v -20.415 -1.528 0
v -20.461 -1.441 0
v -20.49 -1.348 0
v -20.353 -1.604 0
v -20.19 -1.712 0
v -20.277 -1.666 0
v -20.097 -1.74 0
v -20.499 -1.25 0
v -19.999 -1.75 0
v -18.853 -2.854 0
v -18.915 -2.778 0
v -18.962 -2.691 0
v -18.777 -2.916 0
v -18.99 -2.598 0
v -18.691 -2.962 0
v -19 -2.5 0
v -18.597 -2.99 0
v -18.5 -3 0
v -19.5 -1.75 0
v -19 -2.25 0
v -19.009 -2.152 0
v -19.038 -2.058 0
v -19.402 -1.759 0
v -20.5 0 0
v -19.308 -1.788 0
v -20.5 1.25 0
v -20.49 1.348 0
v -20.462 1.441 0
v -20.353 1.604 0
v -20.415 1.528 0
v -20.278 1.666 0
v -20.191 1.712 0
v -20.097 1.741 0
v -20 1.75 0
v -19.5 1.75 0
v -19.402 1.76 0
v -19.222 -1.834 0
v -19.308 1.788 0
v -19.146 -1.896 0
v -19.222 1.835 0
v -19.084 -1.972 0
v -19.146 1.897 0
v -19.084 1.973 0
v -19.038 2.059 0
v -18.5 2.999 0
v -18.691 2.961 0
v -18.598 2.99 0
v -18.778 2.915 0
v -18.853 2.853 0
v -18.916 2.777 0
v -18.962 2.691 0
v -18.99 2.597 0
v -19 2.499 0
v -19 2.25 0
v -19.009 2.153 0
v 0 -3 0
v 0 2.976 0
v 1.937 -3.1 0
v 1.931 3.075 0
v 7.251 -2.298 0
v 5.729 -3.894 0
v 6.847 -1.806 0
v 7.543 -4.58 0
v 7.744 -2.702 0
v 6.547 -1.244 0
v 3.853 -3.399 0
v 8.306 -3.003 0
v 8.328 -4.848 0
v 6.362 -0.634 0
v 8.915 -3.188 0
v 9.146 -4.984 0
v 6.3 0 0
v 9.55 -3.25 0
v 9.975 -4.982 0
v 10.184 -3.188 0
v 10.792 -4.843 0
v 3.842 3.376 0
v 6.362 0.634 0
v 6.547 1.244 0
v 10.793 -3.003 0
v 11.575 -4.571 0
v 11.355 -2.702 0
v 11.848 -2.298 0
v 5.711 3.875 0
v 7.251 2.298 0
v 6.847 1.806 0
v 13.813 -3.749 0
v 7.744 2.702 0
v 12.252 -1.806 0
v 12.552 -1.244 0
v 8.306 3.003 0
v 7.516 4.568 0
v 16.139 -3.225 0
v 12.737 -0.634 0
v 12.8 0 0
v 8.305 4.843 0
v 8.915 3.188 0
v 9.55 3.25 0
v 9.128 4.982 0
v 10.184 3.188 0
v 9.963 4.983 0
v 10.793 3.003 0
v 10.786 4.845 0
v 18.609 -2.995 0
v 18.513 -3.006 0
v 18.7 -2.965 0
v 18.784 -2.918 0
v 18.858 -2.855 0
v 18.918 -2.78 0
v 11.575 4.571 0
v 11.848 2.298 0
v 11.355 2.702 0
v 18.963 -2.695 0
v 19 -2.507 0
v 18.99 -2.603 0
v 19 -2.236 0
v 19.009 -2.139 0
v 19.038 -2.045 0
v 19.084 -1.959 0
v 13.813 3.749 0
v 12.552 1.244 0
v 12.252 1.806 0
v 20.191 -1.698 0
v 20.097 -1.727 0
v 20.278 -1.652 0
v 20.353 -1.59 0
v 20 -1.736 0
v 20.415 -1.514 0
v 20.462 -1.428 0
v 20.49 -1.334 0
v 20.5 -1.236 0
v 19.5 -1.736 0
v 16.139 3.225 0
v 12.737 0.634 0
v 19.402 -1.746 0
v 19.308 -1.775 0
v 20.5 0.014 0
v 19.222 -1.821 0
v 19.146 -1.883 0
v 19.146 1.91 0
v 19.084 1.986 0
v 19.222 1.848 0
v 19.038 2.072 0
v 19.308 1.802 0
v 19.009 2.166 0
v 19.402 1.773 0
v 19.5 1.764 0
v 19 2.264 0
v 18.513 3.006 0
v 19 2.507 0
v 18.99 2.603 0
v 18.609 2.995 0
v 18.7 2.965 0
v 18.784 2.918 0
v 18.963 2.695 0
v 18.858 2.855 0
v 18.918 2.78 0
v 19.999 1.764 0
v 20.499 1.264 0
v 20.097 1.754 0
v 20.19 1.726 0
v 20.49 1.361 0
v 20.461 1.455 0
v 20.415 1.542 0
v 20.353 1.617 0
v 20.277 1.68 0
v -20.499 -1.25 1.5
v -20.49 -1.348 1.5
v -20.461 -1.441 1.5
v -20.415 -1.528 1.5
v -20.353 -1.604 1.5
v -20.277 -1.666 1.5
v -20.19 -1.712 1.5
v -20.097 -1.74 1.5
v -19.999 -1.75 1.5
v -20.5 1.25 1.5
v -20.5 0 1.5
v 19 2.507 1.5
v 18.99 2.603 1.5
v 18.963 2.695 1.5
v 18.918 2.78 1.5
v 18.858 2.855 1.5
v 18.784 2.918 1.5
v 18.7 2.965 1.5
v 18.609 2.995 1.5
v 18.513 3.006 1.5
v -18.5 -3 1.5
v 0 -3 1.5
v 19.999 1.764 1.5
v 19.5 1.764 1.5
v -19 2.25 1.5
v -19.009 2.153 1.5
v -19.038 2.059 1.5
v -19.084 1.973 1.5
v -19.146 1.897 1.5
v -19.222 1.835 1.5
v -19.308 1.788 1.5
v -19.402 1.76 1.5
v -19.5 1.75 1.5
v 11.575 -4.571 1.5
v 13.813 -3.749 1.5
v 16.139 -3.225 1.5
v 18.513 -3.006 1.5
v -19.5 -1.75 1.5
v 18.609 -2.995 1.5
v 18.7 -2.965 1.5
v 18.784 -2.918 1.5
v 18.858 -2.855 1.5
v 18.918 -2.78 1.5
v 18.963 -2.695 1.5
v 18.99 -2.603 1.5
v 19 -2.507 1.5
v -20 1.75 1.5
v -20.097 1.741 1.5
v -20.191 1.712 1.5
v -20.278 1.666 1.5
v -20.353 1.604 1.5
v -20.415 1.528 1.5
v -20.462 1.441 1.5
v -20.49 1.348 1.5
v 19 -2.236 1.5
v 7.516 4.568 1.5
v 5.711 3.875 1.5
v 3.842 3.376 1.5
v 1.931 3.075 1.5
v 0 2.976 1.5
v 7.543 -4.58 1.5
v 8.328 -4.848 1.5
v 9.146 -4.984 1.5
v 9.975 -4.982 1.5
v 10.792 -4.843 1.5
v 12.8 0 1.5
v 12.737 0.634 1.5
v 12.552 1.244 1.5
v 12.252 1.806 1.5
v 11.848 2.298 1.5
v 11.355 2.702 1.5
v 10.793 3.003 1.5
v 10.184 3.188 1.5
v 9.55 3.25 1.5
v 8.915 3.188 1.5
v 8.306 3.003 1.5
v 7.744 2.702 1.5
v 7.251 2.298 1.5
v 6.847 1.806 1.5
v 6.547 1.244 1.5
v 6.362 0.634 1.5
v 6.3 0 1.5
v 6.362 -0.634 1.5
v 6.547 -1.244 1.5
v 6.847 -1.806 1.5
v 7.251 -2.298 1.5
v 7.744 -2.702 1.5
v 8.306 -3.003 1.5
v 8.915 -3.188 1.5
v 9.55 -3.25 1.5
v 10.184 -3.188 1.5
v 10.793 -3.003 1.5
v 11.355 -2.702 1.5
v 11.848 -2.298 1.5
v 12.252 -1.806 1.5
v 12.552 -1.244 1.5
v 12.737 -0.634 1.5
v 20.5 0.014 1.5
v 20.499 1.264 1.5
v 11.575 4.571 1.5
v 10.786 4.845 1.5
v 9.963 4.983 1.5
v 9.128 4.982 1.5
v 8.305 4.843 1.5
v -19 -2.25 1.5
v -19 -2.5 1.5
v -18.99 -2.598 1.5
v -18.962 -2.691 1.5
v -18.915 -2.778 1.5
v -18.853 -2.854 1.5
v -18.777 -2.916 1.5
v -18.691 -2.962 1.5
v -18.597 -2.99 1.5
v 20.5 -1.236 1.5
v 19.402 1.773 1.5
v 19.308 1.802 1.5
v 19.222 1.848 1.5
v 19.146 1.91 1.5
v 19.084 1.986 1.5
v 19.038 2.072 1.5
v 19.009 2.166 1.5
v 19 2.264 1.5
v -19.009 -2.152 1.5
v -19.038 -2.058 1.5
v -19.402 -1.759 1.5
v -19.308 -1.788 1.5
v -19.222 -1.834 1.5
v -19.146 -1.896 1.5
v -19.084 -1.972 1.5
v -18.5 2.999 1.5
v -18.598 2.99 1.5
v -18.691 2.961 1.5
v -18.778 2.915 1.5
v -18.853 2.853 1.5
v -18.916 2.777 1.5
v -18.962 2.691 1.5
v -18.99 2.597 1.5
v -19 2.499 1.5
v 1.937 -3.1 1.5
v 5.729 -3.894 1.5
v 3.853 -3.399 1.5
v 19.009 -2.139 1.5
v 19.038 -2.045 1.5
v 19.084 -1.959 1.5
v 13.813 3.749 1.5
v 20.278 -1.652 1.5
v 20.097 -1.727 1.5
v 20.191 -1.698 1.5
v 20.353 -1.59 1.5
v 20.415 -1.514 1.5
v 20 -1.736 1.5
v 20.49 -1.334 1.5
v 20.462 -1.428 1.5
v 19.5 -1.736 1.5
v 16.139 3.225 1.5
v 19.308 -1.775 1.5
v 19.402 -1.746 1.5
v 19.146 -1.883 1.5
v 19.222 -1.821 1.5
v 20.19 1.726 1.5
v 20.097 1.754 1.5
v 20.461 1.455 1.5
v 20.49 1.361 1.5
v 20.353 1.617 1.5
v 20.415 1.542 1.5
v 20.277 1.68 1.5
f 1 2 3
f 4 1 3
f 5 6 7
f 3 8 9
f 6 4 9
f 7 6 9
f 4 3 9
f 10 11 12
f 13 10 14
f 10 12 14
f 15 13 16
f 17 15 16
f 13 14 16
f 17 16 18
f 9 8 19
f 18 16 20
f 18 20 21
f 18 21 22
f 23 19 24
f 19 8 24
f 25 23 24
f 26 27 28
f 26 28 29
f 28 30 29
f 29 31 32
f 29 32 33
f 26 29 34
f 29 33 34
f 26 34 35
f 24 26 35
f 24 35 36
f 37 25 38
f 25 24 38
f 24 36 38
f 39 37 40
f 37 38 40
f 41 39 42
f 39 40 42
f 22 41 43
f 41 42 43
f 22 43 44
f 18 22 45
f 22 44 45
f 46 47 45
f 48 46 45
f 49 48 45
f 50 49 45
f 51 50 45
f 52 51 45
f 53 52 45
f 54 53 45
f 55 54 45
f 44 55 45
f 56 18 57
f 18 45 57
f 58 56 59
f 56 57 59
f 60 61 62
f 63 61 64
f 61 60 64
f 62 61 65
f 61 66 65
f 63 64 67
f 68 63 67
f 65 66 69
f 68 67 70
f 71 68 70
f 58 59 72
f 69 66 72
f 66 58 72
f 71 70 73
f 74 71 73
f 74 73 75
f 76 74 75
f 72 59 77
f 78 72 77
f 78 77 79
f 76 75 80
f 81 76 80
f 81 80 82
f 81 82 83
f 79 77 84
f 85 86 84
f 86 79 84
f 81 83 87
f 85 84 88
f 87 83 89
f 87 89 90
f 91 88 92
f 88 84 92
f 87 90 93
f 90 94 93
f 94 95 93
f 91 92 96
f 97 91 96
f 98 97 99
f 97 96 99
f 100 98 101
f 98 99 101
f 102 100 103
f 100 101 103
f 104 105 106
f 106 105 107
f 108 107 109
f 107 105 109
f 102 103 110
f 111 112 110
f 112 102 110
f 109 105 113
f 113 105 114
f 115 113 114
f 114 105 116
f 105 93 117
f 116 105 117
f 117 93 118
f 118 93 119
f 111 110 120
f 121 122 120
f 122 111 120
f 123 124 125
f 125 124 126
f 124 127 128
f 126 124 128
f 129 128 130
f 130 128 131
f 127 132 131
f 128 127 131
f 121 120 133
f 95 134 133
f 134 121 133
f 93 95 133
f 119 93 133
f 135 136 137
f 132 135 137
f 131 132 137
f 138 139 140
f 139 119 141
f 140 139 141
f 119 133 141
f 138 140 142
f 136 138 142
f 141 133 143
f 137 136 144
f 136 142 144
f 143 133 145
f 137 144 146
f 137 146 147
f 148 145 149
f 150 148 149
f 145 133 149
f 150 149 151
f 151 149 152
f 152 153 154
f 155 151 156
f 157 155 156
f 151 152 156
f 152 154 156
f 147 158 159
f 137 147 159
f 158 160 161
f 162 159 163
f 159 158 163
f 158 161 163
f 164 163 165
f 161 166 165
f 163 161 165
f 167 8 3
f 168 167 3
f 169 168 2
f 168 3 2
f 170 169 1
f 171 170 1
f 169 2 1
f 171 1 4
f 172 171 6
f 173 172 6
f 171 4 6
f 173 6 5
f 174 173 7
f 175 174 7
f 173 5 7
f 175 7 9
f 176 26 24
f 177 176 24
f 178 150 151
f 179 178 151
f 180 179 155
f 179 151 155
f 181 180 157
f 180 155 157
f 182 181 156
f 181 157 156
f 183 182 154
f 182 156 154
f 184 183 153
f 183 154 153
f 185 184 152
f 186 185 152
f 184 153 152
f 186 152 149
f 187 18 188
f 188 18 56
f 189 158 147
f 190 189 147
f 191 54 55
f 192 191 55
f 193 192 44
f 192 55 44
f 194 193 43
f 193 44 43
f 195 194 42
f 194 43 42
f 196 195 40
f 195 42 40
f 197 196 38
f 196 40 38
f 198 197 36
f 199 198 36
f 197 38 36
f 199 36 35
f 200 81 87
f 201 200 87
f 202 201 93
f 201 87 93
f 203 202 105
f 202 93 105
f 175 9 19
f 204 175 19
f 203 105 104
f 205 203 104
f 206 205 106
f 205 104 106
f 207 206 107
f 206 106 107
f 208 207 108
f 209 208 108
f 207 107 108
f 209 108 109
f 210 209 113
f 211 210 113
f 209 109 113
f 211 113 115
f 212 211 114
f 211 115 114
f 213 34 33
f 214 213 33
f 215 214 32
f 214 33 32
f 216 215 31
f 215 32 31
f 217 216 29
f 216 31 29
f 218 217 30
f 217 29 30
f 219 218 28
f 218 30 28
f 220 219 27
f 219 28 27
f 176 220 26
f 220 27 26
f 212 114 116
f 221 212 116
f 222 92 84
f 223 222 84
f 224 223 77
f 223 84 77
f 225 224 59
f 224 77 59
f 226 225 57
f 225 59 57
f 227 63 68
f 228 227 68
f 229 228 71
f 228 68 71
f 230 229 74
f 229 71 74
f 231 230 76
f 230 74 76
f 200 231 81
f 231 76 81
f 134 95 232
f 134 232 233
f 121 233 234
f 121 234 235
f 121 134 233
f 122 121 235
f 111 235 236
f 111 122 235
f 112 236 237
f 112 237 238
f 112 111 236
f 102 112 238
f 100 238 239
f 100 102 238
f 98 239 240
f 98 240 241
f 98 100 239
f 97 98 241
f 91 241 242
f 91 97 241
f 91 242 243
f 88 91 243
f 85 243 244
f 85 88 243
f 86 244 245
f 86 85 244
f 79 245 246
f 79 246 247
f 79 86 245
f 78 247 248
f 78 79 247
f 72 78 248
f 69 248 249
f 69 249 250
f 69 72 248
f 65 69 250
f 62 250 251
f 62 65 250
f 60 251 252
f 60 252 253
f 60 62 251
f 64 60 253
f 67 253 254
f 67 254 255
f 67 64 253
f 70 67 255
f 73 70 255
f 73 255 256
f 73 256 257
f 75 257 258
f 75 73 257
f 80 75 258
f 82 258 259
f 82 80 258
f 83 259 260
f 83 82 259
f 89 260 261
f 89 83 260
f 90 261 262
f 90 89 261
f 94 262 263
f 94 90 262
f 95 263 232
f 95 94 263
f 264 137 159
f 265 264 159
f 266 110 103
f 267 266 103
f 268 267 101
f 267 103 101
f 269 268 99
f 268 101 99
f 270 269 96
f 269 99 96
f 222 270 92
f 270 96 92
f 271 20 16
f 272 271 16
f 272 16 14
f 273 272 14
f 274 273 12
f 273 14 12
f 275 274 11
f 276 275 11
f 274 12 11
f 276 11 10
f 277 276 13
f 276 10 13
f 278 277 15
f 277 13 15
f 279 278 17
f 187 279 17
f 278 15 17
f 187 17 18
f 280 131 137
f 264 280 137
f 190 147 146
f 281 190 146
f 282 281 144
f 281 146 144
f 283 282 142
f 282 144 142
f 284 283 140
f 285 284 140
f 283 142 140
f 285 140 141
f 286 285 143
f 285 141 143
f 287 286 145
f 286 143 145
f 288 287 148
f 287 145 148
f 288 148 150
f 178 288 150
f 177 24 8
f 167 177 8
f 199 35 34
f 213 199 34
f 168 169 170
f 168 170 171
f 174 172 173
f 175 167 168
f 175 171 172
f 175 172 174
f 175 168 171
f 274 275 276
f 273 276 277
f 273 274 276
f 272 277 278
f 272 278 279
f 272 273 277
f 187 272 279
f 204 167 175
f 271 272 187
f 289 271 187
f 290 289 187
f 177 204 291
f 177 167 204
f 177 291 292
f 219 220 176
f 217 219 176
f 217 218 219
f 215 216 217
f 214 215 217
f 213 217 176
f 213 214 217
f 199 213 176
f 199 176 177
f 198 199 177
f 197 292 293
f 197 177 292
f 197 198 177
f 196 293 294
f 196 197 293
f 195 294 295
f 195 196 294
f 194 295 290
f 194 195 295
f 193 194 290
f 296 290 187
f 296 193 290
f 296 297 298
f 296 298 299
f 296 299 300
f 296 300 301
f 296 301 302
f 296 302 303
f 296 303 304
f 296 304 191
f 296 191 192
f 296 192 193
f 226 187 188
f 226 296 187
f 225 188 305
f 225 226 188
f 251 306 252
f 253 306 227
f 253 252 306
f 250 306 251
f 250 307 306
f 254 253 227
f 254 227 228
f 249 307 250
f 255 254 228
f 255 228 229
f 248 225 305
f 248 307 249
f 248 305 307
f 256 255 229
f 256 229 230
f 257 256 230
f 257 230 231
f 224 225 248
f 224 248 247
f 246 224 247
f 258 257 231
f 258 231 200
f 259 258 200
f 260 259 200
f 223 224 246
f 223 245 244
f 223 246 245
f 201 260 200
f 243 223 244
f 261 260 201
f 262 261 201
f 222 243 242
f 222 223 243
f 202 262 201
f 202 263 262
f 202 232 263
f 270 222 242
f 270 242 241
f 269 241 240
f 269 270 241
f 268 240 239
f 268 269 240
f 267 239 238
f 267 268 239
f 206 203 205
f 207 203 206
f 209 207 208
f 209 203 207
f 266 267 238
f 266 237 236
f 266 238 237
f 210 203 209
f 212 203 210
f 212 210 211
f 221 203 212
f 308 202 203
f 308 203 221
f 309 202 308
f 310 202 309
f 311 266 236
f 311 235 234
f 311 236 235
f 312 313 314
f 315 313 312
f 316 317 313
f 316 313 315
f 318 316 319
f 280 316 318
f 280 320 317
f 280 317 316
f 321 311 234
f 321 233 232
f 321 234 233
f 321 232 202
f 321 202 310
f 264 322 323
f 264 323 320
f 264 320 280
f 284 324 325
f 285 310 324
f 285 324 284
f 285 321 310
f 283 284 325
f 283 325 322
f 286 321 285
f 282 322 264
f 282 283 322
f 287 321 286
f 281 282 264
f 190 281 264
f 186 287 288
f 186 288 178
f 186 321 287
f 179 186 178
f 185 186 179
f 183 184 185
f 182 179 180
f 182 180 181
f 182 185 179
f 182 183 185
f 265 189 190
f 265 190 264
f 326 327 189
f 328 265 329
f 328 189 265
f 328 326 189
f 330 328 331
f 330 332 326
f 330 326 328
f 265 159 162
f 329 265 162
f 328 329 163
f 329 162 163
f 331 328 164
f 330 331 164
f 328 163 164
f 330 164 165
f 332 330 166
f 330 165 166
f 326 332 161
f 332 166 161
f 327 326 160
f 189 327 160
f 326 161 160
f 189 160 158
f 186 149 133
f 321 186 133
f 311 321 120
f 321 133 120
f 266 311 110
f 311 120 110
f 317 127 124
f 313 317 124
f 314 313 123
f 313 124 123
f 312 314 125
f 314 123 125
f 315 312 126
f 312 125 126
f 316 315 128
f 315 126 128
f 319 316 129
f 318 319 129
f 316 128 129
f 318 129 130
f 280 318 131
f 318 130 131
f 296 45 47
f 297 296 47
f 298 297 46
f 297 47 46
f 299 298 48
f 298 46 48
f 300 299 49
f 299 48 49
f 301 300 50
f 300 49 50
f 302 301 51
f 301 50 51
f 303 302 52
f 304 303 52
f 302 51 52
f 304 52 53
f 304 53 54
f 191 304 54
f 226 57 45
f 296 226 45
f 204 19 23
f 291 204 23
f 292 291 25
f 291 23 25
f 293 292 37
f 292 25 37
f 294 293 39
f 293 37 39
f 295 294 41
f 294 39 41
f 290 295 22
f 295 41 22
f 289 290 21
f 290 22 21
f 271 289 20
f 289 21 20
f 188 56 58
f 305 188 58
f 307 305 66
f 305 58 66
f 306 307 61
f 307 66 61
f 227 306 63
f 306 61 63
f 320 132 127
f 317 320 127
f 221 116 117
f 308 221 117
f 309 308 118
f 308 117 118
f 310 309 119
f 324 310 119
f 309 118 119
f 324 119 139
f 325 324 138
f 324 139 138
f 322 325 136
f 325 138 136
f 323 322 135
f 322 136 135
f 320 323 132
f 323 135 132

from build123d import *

# Parameters (mm, degrees)
F0_R     = 3.25
F1_DEPTH = 1.5


# Not quite as in the source:
# - ends of sketch curves that miss each other by under 0.0002 mm in the source are joined


with BuildPart() as f1:
    # F0 (on Top) → F1 (new body)
    with BuildSketch(Plane.XY):
        with BuildLine():
            ThreePointArc((11.5751507446, -4.5713014237), (14.9674174979, -3.4491015551), (18.5129609838, -3.00646439))
            ThreePointArc((18.5129609838, -3.00646439), (18.8578988072, -2.8554676082), (18.999681, -2.506641))
            Line((18.999681, -2.506641), (18.999681, -2.236416))
            ThreePointArc((18.999681, -2.236416), (19.1460678639, -1.882922365), (19.499512, -1.7364160286))
            Line((19.499512, -1.7364160286), (19.999851, -1.736246))
            ThreePointArc((19.999851, -1.736246), (20.3532944896, -1.5897392814), (20.499681, -1.236246))
            Line((20.499681, -1.236246), (20.499681, 0.013923))
            Line((20.499681, 0.013923), (20.499257, 1.263923))
            ThreePointArc((20.499257, 1.263923), (20.352690162, 1.6174265783), (19.999087, 1.7637529711))
            Line((19.999087, 1.7637529711), (19.499851, 1.763584))
            ThreePointArc((19.499851, 1.763584), (19.1461877186, 1.9099705104), (18.999681, 2.263584))
            Line((18.999681, 2.263584), (18.999681, 2.50664))
            ThreePointArc((18.999681, 2.50664), (18.8578988072, 2.8554666082), (18.5129609897, 3.0064636108))
            ThreePointArc((18.5129609897, 3.0064636108), (14.9674177085, 3.4491015077), (11.575151115, 4.5713012596))
            ThreePointArc((11.575151115, 4.5713012596), (9.5454328003, 4.9999983336), (7.5164170751, 4.5679878314))
            ThreePointArc((7.5164170751, 4.5679878314), (3.8419543275, 3.3757683124), (-0.000319, 2.9757689864))
            Line((-0.000319, 2.9757689864), (-18.499681, 2.999361))
            ThreePointArc((-18.499681, 2.999361), (-18.4999199994, 2.9993618408), (-18.5001589997, 2.9993619744))
            ThreePointArc((-18.5001589997, 2.9993619744), (-18.853403349, 2.8527463514), (-18.999681, 2.499362))
            Line((-18.999681, 2.499362), (-18.999681, 2.250339))
            ThreePointArc((-18.999681, 2.250339), (-19.1460675104, 1.8968457186), (-19.499511, 1.7503390289))
            Line((-19.499511, 1.7503390289), (-19.999851, 1.75017))
            ThreePointArc((-19.999851, 1.75017), (-20.3532944896, 1.6036632814), (-20.499681, 1.25017))
            Line((-20.499681, 1.25017), (-20.499681, 0))
            Line((-20.499681, 0), (-20.499256, -1.25))
            ThreePointArc((-20.499256, -1.25), (-20.3526895157, -1.6035032249), (-19.999087, -1.7498299714))
            Line((-19.999087, -1.7498299714), (-19.499851, -1.749661))
            ThreePointArc((-19.499851, -1.749661), (-19.1461877186, -1.8960475104), (-18.999681, -2.249661))
            Line((-18.999681, -2.249661), (-18.999681, -2.5))
            ThreePointArc((-18.999681, -2.5), (-18.8532343906, -2.8535533906), (-18.499681, -3))
            Line((-18.499681, -3), (-0.000319, -3))
            ThreePointArc((-0.000319, -3), (3.8532843758, -3.3991955476), (7.5432329323, -4.5798291546))
            ThreePointArc((7.5432329323, -4.5798291546), (9.5600895804, -4.9999888178), (11.5751507446, -4.5713014237))
        make_face()
        with Locations((9.549515, 0)):
            Circle(F0_R, mode=Mode.SUBTRACT)
    extrude(amount=F1_DEPTH)


solid = f1.part
